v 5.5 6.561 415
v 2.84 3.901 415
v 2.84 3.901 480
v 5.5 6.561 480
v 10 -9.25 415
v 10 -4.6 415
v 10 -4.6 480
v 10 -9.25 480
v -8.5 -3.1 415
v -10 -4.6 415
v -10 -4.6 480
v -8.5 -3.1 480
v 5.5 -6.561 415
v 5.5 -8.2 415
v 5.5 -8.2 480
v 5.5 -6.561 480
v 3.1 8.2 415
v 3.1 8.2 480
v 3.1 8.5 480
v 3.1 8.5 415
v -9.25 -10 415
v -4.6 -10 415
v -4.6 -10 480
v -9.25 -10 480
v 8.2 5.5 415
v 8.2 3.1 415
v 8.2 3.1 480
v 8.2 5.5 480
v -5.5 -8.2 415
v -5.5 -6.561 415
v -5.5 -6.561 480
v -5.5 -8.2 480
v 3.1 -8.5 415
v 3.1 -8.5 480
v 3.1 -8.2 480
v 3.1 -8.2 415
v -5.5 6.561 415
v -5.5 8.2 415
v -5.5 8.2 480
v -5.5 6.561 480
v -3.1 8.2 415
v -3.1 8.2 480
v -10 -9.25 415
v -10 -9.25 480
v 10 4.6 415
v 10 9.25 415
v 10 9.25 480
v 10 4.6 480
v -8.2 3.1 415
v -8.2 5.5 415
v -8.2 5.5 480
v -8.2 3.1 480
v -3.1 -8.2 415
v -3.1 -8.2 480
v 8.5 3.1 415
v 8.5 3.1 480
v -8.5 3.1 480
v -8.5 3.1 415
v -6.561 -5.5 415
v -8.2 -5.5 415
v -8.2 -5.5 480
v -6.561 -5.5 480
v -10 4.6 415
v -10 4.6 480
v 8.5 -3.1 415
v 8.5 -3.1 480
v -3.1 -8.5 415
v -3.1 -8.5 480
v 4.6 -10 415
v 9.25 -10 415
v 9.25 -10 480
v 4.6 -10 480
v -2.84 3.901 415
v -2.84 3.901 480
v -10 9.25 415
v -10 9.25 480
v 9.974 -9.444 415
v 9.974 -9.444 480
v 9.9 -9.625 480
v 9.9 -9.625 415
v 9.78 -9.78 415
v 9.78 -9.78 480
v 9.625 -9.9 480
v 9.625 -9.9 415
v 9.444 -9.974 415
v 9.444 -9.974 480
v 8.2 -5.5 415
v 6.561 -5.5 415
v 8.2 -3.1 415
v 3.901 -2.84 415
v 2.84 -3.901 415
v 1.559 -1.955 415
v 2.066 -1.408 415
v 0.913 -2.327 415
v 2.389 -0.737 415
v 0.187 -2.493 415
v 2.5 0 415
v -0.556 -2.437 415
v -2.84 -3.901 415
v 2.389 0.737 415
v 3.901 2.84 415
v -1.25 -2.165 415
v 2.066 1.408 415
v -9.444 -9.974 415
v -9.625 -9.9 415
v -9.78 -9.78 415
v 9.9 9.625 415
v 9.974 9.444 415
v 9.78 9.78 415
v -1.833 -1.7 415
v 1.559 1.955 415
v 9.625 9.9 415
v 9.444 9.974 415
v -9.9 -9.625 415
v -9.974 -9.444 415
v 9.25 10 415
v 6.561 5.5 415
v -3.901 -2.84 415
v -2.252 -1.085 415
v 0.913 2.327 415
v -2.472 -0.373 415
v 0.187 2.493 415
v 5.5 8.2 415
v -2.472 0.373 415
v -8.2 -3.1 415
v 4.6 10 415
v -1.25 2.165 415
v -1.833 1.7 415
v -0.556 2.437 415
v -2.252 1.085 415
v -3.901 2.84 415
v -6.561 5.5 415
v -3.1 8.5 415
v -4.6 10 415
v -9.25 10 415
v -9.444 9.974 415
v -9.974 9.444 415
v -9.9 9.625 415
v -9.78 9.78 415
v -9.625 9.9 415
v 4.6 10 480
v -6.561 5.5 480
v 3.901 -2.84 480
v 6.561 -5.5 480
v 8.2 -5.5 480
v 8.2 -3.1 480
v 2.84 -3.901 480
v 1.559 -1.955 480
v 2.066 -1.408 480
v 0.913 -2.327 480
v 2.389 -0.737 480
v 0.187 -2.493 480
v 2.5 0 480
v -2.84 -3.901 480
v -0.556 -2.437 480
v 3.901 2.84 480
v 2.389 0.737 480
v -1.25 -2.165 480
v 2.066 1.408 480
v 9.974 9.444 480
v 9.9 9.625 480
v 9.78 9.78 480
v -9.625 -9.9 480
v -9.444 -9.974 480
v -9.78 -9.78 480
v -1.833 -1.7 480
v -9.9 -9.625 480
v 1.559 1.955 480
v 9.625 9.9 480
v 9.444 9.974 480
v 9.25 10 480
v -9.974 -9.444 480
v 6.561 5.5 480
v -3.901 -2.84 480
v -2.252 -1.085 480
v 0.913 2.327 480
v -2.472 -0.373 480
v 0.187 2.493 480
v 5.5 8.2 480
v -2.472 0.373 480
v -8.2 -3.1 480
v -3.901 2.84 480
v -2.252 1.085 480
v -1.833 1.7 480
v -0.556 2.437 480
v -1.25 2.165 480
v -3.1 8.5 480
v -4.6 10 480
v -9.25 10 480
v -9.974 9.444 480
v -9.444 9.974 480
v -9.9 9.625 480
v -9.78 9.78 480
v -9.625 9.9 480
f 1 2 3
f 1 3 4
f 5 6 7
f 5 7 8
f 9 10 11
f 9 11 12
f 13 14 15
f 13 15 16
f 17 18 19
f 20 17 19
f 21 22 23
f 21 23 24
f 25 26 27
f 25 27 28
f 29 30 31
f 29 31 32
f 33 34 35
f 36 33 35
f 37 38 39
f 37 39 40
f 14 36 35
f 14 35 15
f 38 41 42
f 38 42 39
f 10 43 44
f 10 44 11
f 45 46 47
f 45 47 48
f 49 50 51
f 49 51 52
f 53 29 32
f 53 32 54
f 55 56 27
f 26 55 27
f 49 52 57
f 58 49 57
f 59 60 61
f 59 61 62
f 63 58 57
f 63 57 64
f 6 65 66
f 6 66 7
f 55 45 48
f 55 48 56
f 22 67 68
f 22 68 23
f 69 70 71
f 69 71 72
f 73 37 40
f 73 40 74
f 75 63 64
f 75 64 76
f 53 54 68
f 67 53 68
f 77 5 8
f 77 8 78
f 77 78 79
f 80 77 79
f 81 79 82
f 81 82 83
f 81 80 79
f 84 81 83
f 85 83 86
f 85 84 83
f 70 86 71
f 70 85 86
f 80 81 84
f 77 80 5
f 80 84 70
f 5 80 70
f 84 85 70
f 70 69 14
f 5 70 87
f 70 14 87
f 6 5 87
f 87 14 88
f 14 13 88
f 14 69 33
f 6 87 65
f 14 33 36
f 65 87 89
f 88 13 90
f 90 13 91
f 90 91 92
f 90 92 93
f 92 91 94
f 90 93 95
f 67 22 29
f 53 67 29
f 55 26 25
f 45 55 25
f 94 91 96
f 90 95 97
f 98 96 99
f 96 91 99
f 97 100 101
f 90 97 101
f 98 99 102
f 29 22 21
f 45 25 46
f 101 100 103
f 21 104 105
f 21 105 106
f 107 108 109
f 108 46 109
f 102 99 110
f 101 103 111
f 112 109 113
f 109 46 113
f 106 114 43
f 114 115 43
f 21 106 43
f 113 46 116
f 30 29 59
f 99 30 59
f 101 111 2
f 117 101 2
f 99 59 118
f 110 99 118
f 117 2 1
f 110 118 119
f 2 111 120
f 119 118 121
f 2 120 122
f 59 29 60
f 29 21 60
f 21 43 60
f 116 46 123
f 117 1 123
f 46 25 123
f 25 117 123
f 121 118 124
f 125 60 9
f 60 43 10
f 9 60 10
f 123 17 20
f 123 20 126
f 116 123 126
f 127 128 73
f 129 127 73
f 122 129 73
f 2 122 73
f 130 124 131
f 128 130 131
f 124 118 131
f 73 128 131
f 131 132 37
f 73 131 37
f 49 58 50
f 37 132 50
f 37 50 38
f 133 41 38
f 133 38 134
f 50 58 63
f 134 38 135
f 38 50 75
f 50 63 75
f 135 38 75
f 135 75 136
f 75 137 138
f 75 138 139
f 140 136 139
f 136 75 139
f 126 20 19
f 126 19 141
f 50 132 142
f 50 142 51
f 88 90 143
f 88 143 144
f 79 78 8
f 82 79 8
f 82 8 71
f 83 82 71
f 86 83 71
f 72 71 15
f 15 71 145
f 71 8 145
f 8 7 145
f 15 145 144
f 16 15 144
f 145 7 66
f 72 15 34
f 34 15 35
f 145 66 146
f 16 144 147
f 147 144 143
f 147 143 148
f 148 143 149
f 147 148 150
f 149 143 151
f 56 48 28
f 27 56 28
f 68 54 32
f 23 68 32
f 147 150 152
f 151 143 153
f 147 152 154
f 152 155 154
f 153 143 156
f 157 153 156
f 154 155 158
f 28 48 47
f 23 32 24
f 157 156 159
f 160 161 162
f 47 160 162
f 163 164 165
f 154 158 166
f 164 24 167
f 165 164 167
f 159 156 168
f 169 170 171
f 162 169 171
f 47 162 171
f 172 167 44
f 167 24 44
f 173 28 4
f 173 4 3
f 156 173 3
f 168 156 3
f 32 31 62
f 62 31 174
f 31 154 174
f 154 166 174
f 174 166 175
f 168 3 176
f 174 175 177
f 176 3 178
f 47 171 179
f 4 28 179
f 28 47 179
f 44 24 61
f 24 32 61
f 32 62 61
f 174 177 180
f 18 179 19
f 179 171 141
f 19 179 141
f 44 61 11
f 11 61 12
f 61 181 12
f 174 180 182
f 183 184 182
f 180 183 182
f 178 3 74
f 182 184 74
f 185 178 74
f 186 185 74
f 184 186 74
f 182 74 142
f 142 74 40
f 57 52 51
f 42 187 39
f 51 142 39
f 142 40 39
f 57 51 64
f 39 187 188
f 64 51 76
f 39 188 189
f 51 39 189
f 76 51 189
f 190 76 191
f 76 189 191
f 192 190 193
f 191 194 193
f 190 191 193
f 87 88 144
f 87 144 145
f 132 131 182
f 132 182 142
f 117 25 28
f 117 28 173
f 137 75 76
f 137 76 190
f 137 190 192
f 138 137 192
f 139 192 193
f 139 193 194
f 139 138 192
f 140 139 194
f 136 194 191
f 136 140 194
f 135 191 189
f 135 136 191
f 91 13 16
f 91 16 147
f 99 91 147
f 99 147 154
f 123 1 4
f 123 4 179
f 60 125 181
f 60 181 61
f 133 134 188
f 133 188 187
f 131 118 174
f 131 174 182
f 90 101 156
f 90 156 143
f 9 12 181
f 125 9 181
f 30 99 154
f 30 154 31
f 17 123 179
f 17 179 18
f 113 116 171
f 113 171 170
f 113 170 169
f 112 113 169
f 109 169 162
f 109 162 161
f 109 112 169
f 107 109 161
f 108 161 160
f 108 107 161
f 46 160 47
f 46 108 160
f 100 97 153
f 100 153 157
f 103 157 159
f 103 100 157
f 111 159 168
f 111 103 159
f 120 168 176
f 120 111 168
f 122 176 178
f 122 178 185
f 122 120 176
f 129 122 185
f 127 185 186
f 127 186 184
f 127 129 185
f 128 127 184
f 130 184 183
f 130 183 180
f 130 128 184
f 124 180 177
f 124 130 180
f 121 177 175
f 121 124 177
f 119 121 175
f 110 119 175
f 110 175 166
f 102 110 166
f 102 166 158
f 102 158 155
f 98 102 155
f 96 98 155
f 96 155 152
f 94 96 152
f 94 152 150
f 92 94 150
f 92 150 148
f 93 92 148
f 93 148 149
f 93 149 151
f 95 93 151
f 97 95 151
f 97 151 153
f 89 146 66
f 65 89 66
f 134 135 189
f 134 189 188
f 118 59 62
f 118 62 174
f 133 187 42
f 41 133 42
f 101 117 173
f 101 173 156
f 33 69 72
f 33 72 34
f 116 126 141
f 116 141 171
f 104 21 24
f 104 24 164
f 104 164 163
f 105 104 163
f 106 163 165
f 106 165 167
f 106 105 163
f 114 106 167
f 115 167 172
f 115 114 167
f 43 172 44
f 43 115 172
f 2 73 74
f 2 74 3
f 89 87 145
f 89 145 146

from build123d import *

# Parameters (mm, degrees)
CROQUIS1_R              = 2.5
SALIENTE_EXTRUIR1_DEPTH = 480
CUT_EXTRUDE1_DEPTH      = 47
CUT_EXTRUDE1_DEPTH_BACK = 46
SKETCH2_W               = 830
SKETCH2_H               = 37.339467532


with BuildPart() as part:
    # Croquis1 → Saliente-Extruir1 (new body)
    with BuildSketch(Plane.XY):
        with BuildLine():
            Line((-4.6, 10), (-3.1, 8.5))
            Line((-3.1, 8.5), (-3.1, 8.2))
            Line((-3.1, 8.2), (-5.5, 8.2))
            Line((-5.5, 8.2), (-5.5, 6.560660172))
            Line((-5.5, 6.560660172), (-2.84, 3.900660172))
            Line((-2.84, 3.900660172), (0, 3.900660172))
            Line((0, 3.900660172), (2.84, 3.900660172))
            Line((2.84, 3.900660172), (5.5, 6.560660172))
            Line((5.5, 6.560660172), (5.5, 8.2))
            Line((5.5, 8.2), (3.1, 8.2))
            Line((3.1, 8.2), (3.1, 8.5))
            Line((3.1, 8.5), (4.6, 10))
            Line((4.6, 10), (9.25, 10))
            ThreePointArc((9.25, 10), (9.780330086, 9.780330086), (10, 9.25))
            Line((10, 9.25), (10, 4.6))
            Line((10, 4.6), (8.5, 3.1))
            Line((8.5, 3.1), (8.2, 3.1))
            Line((8.2, 3.1), (8.2, 5.5))
            Line((8.2, 5.5), (6.560660172, 5.5))
            Line((6.560660172, 5.5), (3.900660172, 2.84))
            Line((3.900660172, 2.84), (3.900660172, 0))
            Line((3.900660172, 0), (3.900660172, -2.84))
            Line((3.900660172, -2.84), (6.560660172, -5.5))
            Line((6.560660172, -5.5), (8.2, -5.5))
            Line((8.2, -5.5), (8.2, -3.1))
            Line((8.2, -3.1), (8.5, -3.1))
            Line((8.5, -3.1), (10, -4.6))
            Line((10, -4.6), (10, -9.25))
            ThreePointArc((10, -9.25), (9.780330086, -9.780330086), (9.25, -10))
            Line((9.25, -10), (4.6, -10))
            Line((4.6, -10), (3.1, -8.5))
            Line((3.1, -8.5), (3.1, -8.2))
            Line((3.1, -8.2), (5.5, -8.2))
            Line((5.5, -8.2), (5.5, -6.560660172))
            Line((5.5, -6.560660172), (2.84, -3.900660172))
            Line((2.84, -3.900660172), (0, -3.900660172))
            Line((0, -3.900660172), (-2.84, -3.900660172))
            Line((-2.84, -3.900660172), (-5.5, -6.560660172))
            Line((-5.5, -6.560660172), (-5.5, -8.2))
            Line((-5.5, -8.2), (-3.1, -8.2))
            Line((-3.1, -8.2), (-3.1, -8.5))
            Line((-3.1, -8.5), (-4.6, -10))
            Line((-4.6, -10), (-9.25, -10))
            ThreePointArc((-9.25, -10), (-9.780330086, -9.780330086), (-10, -9.25))
            Line((-10, -9.25), (-10, -4.6))
            Line((-10, -4.6), (-8.5, -3.1))
            Line((-8.5, -3.1), (-8.2, -3.1))
            Line((-8.2, -3.1), (-8.2, -5.5))
            Line((-8.2, -5.5), (-6.560660172, -5.5))
            Line((-6.560660172, -5.5), (-3.900660172, -2.84))
            Line((-3.900660172, -2.84), (-3.900660172, 0))
            Line((-3.900660172, 0), (-3.900660172, 2.84))
            Line((-3.900660172, 2.84), (-6.560660172, 5.5))
            Line((-6.560660172, 5.5), (-8.2, 5.5))
            Line((-8.2, 5.5), (-8.2, 3.1))
            Line((-8.2, 3.1), (-8.5, 3.1))
            Line((-8.5, 3.1), (-10, 4.6))
            Line((-10, 4.6), (-10, 9.25))
            ThreePointArc((-10, 9.25), (-9.780330086, 9.780330086), (-9.25, 10))
            Line((-9.25, 10), (-4.6, 10))
        make_face()
        Circle(CROQUIS1_R, mode=Mode.SUBTRACT)
    extrude(amount=SALIENTE_EXTRUIR1_DEPTH)

    # Sketch2 → Cut-Extrude1 (cut, two sides: drawn at the far end of the back side and taken through both)
    with BuildSketch(Plane(origin=(0, 0, 0), x_dir=(0, 0, -1), z_dir=(1, 0, 0)).offset(-CUT_EXTRUDE1_DEPTH_BACK)):
        Rectangle(SKETCH2_W, SKETCH2_H)
    extrude(amount=CUT_EXTRUDE1_DEPTH + CUT_EXTRUDE1_DEPTH_BACK, mode=Mode.SUBTRACT)


solid = part.part
